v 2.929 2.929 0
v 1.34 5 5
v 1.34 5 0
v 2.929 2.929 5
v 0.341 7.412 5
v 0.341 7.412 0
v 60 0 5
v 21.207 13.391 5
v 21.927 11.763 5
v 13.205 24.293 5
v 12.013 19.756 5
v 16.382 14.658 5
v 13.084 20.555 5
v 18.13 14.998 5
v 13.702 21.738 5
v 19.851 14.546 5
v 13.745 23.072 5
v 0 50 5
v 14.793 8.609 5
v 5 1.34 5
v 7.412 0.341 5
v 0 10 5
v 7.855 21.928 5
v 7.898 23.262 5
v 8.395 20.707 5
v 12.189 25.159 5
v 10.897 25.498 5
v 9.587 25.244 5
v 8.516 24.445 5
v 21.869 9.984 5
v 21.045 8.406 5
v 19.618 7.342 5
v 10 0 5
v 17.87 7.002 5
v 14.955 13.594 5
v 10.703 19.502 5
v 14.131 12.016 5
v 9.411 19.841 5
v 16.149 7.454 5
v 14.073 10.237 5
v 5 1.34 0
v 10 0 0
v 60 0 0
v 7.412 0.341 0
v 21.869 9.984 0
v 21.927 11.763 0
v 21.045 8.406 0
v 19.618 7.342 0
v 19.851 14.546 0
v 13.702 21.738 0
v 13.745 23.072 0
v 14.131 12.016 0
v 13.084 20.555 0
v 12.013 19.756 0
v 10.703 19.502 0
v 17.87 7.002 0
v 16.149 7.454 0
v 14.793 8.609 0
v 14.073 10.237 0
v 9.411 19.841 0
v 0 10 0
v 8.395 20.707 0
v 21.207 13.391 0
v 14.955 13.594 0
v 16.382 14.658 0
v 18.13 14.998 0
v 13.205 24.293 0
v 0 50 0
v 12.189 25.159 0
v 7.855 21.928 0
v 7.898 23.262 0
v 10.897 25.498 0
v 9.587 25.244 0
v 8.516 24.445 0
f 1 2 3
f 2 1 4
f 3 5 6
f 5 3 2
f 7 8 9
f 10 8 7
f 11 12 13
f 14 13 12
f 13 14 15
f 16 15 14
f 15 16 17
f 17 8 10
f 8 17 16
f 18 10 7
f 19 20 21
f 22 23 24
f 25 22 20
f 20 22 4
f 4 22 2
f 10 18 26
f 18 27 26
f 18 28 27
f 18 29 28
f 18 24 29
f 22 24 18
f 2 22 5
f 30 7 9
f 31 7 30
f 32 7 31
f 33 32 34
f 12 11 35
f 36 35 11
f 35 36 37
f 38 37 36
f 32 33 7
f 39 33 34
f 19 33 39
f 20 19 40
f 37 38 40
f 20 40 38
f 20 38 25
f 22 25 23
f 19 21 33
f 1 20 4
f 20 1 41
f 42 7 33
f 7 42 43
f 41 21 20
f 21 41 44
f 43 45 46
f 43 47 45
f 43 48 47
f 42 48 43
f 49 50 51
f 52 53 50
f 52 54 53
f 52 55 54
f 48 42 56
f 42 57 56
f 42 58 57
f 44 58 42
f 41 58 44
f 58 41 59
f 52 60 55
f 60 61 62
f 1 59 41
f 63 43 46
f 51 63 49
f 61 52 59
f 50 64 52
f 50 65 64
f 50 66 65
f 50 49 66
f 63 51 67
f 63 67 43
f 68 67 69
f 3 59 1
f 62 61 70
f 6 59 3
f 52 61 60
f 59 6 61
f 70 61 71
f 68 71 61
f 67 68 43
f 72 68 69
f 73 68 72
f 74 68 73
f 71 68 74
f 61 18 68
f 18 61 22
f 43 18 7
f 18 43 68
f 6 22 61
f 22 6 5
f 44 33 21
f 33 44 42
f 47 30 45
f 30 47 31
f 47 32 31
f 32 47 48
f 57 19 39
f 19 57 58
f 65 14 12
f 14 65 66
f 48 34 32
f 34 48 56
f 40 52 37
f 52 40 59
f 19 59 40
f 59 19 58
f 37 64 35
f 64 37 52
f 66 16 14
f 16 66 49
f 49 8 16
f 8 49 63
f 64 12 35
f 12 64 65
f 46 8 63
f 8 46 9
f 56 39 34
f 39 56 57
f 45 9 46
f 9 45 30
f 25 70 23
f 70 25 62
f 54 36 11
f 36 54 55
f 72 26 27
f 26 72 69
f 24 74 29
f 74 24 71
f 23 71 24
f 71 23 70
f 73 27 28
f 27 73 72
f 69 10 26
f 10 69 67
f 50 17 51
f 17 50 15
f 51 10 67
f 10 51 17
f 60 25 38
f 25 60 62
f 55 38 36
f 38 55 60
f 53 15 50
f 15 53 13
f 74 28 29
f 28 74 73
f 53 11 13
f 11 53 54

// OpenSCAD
$fn = 32;

// ----------------------------------------------------------------------
// Bracket plate: corner pad 60 x 50, fillet R10
// ----------------------------------------------------------------------

// --- parameters (mm) ---
hole_r = 3;               // bolt hole radius
plate_t = 5;              // plate thickness, Z (extrusion height)
leg_a = 60;               // base leg
leg_b = 50;               // height leg
fillet_r = 10;            // right-angle fillet radius

hole_d1 = 2 * hole_r + 2;
hole_d2 = 2 * hole_r;

profile = [[10, 0], [60, 0], [0, 50], [0, 10], [0.341, 7.412], [1.34, 5], [2.929, 2.929], [5, 1.34], [7.412, 0.341]];  // primary outline, 9 points, counter clockwise
void_1 = [[21.927, 11.763], [21.207, 13.391], [19.851, 14.546], [18.13, 14.998], [16.382, 14.658], [14.955, 13.594], [14.131, 12.016], [14.073, 10.237], [14.793, 8.609], [16.149, 7.454], [17.87, 7.002], [19.618, 7.342], [21.045, 8.406], [21.869, 9.984]];  // mount hole 1, 14 points
void_2 = [[13.745, 23.072], [13.205, 24.293], [12.189, 25.159], [10.897, 25.498], [9.587, 25.244], [8.516, 24.445], [7.898, 23.262], [7.855, 21.928], [8.395, 20.707], [9.411, 19.841], [10.703, 19.502], [12.013, 19.756], [13.084, 20.555], [13.702, 21.738]];  // mount hole 2, 14 points

// --- the one profile operation ---
difference() {
  linear_extrude(height = plate_t) polygon(points = profile);
  translate([0, 0, -1])
    linear_extrude(height = plate_t + 2) polygon(points = void_1);
  translate([0, 0, -1])
    linear_extrude(height = plate_t + 2) polygon(points = void_2);
}
